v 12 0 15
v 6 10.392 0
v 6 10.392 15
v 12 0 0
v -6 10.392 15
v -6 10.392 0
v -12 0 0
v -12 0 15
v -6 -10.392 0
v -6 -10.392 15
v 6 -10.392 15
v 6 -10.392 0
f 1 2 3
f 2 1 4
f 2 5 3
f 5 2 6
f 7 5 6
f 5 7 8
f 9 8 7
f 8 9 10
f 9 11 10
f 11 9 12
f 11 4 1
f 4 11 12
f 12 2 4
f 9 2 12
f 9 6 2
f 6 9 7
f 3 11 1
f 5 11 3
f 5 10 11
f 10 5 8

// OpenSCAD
// Original MechIntel educational model. CC0-1.0. Units: mm.
// Not a standardized or load-rated component.
$fn=96;
across_corners=24;
height=15;
cylinder(d=across_corners,h=height,$fn=6);
